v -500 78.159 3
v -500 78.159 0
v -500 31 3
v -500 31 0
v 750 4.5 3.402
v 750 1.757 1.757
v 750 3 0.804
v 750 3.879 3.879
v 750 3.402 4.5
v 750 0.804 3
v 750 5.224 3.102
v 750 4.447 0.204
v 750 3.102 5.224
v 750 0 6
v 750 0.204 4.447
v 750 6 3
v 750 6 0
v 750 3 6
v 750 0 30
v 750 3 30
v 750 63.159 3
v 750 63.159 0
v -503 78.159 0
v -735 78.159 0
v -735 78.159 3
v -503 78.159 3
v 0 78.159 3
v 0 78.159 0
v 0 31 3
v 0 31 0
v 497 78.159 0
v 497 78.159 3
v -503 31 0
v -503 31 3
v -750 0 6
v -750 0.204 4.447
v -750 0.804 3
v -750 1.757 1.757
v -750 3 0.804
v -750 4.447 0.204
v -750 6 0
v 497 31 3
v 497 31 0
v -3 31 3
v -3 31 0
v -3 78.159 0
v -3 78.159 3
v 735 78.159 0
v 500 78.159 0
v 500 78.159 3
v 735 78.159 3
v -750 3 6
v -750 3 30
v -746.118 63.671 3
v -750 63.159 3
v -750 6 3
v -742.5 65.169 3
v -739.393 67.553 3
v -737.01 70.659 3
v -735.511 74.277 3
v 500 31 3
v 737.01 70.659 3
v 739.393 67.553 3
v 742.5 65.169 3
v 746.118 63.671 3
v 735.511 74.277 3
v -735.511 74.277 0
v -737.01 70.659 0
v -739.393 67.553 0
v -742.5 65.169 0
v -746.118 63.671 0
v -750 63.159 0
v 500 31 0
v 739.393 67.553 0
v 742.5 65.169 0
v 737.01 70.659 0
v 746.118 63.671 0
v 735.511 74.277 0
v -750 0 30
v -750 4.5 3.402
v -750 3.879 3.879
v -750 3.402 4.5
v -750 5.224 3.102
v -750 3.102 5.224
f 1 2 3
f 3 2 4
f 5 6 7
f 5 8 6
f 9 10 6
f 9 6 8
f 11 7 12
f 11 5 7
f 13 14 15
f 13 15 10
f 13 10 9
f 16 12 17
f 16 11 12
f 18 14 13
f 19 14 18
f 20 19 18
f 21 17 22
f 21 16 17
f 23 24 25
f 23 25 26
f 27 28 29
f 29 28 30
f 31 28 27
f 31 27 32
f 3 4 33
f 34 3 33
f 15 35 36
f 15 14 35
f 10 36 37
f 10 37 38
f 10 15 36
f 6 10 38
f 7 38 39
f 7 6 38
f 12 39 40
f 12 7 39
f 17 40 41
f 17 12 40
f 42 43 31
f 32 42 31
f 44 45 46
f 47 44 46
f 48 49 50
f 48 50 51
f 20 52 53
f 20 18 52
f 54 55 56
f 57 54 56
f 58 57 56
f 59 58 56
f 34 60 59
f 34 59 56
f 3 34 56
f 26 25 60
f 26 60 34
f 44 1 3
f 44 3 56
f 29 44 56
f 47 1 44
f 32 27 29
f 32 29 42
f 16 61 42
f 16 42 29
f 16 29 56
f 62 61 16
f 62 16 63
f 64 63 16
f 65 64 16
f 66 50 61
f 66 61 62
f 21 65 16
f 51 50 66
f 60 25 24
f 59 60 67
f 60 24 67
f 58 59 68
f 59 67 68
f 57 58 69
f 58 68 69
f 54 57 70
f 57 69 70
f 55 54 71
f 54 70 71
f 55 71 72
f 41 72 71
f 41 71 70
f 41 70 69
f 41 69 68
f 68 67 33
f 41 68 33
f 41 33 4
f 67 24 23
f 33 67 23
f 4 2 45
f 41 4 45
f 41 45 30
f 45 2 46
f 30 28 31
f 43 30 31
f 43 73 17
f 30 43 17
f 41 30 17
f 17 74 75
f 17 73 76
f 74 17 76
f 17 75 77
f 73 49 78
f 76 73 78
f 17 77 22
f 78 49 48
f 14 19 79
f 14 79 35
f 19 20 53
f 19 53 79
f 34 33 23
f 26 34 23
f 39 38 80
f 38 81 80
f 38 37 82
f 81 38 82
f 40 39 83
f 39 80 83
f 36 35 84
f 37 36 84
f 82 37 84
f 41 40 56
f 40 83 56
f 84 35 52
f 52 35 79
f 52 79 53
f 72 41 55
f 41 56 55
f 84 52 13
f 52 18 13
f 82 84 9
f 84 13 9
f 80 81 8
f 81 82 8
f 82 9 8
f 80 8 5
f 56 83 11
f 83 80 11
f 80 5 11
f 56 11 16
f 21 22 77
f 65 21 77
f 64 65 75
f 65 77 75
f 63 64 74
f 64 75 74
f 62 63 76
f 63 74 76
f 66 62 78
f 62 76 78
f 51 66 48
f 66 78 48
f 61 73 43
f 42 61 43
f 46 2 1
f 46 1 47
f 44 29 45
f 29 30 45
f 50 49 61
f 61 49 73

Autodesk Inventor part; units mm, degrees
ref_plane "YZ Plane" through (0, 0, 0) normal (1, 0, 0) x (0, 1, 0)
ref_plane "XZ Plane" through (0, 0, 0) normal (0, 1, 0) x (-1, 0, 0)
ref_plane "XY Plane" through (0, 0, 0) normal (0, 0, 1) x (1, 0, 0)
sketch "Sketch1" plane through (0, 0, 0) normal (0, 0, 1) x (1, 0, 0)
  line L0 (-750, 78.1594) -> (750, 78.1594)
  line L1 (750, 78.1594) -> (750, 0)
  line L2 (750, 0) -> (-750, 0)
  line L3 (-750, 0) -> (-750, 78.1594)
  point P0 (0, 0)
  point P1 (0, 0)
  dimension "d0" = 1500
  dimension "d1" = 78.1594
extrude "Plate1" add sketch "Sketch1" along normal blind 3
sketch "Sketch2" plane through (750, 3, 0) normal (0, -1, 0) x (1, 0, 0)
  line L0 (-1500, 0) -> (0, 0)
  line L1 (0, 0) -> (0, 30)
  line L2 (0, 30) -> (-1500, 30)
  line L3 (-1500, 30) -> (-1500, 0)
edge flange "Flange1" height 30 angle 90 thickness 3 bend radius 3 thickness toward (0, -1, 0) relief tear relief width 3 relief depth 1.5 edges at (0, 0, 3) wall of the first edge with corners at (-750, 3, 0) (750, 3, 0) (750, 3, 30) (-750, 3, 30)
bend "Bend1"
corner "Corner1"
sketch "Sketch5" plane through (0, 0, 0) normal (0, 0, -1) x (-1, 0, 0)
  line L0 (750, 78.1594) -> (-750, 78.1594) projected
  line L1 (500, 78.1594) -> (500, 31)
  line L2 (500, 31) -> (503, 31)
  line L3 (503, 31) -> (503, 78.1594)
  line L4 (750, 0) -> (-750, 0) projected
  point P0 (0, 0)
  dimension "d18" = 3
  dimension "d19" = 247
  dimension "d20" = 31
extrude "Extrusion1" cut sketch "Sketch5" against normal through all
pattern_linear "Rectangular Pattern1" count 3 spacing 500 along (1, 0, 0) of "Extrusion1"
sketch "Sketch6" plane through (0, 0, 0) normal (0, 0, -1) x (-1, 0, 0)
  line L0 (-750, 78.1594) -> (-750, 6) projected
  circle A0 centre (-750, 78.1594) radius 15
  line L1 (-750, 78.1594) -> (-500, 78.1594) projected
  point P0 (0, 0)
  point P1 (-735, 78.1594)
  point P2 (-750, 63.1594)
  dimension "d24" = 30
extrude "Extrusion2" cut sketch "Sketch6" against normal through all contours L1 A0 L0 picked at (-740.1254, 77.0468)
mirror "Mirror1" about plane through (0, 0, 0) normal (1, 0, 0) of "Extrusion2"
equation "\"d1\" = Стрингер_6"
equation "\"d18\" = Thickness"
equation "\"d2\" = Thickness"
equation "\"d3\" = BendReliefWidth"
equation "\"d4\" = BendReliefDepth"
equation "\"d5\" = MinimumRemnant"
equation "\"d6\" = TransitionRadius"
equation "\"d9\" = BendRadius"
equation "\"d10\" = CornerReliefSize"
equation "\"d11\" = GapSize"
equation "\"d12\" = JacobiRadiusSize"
equation "\"BendRadius\" = Thickness"
equation "\"BendReliefWidth\" = Thickness"
equation "\"BendReliefDepth\" = 0.5 * Thickness"
equation "\"CornerReliefSize\" = 4 * Thickness"
equation "\"MinimumRemnant\" = 2 * Thickness"
equation "\"TransitionRadius\" = BendRadius"
equation "\"JacobiRadiusSize\" = BendRadius"
equation "\"GapSize\" = Thickness"
equation "\"Стрингер_6\" = 78.159354"
equation "\"Thickness\" = 3"
properties part number "МОО 056 стрингер борт 61"
